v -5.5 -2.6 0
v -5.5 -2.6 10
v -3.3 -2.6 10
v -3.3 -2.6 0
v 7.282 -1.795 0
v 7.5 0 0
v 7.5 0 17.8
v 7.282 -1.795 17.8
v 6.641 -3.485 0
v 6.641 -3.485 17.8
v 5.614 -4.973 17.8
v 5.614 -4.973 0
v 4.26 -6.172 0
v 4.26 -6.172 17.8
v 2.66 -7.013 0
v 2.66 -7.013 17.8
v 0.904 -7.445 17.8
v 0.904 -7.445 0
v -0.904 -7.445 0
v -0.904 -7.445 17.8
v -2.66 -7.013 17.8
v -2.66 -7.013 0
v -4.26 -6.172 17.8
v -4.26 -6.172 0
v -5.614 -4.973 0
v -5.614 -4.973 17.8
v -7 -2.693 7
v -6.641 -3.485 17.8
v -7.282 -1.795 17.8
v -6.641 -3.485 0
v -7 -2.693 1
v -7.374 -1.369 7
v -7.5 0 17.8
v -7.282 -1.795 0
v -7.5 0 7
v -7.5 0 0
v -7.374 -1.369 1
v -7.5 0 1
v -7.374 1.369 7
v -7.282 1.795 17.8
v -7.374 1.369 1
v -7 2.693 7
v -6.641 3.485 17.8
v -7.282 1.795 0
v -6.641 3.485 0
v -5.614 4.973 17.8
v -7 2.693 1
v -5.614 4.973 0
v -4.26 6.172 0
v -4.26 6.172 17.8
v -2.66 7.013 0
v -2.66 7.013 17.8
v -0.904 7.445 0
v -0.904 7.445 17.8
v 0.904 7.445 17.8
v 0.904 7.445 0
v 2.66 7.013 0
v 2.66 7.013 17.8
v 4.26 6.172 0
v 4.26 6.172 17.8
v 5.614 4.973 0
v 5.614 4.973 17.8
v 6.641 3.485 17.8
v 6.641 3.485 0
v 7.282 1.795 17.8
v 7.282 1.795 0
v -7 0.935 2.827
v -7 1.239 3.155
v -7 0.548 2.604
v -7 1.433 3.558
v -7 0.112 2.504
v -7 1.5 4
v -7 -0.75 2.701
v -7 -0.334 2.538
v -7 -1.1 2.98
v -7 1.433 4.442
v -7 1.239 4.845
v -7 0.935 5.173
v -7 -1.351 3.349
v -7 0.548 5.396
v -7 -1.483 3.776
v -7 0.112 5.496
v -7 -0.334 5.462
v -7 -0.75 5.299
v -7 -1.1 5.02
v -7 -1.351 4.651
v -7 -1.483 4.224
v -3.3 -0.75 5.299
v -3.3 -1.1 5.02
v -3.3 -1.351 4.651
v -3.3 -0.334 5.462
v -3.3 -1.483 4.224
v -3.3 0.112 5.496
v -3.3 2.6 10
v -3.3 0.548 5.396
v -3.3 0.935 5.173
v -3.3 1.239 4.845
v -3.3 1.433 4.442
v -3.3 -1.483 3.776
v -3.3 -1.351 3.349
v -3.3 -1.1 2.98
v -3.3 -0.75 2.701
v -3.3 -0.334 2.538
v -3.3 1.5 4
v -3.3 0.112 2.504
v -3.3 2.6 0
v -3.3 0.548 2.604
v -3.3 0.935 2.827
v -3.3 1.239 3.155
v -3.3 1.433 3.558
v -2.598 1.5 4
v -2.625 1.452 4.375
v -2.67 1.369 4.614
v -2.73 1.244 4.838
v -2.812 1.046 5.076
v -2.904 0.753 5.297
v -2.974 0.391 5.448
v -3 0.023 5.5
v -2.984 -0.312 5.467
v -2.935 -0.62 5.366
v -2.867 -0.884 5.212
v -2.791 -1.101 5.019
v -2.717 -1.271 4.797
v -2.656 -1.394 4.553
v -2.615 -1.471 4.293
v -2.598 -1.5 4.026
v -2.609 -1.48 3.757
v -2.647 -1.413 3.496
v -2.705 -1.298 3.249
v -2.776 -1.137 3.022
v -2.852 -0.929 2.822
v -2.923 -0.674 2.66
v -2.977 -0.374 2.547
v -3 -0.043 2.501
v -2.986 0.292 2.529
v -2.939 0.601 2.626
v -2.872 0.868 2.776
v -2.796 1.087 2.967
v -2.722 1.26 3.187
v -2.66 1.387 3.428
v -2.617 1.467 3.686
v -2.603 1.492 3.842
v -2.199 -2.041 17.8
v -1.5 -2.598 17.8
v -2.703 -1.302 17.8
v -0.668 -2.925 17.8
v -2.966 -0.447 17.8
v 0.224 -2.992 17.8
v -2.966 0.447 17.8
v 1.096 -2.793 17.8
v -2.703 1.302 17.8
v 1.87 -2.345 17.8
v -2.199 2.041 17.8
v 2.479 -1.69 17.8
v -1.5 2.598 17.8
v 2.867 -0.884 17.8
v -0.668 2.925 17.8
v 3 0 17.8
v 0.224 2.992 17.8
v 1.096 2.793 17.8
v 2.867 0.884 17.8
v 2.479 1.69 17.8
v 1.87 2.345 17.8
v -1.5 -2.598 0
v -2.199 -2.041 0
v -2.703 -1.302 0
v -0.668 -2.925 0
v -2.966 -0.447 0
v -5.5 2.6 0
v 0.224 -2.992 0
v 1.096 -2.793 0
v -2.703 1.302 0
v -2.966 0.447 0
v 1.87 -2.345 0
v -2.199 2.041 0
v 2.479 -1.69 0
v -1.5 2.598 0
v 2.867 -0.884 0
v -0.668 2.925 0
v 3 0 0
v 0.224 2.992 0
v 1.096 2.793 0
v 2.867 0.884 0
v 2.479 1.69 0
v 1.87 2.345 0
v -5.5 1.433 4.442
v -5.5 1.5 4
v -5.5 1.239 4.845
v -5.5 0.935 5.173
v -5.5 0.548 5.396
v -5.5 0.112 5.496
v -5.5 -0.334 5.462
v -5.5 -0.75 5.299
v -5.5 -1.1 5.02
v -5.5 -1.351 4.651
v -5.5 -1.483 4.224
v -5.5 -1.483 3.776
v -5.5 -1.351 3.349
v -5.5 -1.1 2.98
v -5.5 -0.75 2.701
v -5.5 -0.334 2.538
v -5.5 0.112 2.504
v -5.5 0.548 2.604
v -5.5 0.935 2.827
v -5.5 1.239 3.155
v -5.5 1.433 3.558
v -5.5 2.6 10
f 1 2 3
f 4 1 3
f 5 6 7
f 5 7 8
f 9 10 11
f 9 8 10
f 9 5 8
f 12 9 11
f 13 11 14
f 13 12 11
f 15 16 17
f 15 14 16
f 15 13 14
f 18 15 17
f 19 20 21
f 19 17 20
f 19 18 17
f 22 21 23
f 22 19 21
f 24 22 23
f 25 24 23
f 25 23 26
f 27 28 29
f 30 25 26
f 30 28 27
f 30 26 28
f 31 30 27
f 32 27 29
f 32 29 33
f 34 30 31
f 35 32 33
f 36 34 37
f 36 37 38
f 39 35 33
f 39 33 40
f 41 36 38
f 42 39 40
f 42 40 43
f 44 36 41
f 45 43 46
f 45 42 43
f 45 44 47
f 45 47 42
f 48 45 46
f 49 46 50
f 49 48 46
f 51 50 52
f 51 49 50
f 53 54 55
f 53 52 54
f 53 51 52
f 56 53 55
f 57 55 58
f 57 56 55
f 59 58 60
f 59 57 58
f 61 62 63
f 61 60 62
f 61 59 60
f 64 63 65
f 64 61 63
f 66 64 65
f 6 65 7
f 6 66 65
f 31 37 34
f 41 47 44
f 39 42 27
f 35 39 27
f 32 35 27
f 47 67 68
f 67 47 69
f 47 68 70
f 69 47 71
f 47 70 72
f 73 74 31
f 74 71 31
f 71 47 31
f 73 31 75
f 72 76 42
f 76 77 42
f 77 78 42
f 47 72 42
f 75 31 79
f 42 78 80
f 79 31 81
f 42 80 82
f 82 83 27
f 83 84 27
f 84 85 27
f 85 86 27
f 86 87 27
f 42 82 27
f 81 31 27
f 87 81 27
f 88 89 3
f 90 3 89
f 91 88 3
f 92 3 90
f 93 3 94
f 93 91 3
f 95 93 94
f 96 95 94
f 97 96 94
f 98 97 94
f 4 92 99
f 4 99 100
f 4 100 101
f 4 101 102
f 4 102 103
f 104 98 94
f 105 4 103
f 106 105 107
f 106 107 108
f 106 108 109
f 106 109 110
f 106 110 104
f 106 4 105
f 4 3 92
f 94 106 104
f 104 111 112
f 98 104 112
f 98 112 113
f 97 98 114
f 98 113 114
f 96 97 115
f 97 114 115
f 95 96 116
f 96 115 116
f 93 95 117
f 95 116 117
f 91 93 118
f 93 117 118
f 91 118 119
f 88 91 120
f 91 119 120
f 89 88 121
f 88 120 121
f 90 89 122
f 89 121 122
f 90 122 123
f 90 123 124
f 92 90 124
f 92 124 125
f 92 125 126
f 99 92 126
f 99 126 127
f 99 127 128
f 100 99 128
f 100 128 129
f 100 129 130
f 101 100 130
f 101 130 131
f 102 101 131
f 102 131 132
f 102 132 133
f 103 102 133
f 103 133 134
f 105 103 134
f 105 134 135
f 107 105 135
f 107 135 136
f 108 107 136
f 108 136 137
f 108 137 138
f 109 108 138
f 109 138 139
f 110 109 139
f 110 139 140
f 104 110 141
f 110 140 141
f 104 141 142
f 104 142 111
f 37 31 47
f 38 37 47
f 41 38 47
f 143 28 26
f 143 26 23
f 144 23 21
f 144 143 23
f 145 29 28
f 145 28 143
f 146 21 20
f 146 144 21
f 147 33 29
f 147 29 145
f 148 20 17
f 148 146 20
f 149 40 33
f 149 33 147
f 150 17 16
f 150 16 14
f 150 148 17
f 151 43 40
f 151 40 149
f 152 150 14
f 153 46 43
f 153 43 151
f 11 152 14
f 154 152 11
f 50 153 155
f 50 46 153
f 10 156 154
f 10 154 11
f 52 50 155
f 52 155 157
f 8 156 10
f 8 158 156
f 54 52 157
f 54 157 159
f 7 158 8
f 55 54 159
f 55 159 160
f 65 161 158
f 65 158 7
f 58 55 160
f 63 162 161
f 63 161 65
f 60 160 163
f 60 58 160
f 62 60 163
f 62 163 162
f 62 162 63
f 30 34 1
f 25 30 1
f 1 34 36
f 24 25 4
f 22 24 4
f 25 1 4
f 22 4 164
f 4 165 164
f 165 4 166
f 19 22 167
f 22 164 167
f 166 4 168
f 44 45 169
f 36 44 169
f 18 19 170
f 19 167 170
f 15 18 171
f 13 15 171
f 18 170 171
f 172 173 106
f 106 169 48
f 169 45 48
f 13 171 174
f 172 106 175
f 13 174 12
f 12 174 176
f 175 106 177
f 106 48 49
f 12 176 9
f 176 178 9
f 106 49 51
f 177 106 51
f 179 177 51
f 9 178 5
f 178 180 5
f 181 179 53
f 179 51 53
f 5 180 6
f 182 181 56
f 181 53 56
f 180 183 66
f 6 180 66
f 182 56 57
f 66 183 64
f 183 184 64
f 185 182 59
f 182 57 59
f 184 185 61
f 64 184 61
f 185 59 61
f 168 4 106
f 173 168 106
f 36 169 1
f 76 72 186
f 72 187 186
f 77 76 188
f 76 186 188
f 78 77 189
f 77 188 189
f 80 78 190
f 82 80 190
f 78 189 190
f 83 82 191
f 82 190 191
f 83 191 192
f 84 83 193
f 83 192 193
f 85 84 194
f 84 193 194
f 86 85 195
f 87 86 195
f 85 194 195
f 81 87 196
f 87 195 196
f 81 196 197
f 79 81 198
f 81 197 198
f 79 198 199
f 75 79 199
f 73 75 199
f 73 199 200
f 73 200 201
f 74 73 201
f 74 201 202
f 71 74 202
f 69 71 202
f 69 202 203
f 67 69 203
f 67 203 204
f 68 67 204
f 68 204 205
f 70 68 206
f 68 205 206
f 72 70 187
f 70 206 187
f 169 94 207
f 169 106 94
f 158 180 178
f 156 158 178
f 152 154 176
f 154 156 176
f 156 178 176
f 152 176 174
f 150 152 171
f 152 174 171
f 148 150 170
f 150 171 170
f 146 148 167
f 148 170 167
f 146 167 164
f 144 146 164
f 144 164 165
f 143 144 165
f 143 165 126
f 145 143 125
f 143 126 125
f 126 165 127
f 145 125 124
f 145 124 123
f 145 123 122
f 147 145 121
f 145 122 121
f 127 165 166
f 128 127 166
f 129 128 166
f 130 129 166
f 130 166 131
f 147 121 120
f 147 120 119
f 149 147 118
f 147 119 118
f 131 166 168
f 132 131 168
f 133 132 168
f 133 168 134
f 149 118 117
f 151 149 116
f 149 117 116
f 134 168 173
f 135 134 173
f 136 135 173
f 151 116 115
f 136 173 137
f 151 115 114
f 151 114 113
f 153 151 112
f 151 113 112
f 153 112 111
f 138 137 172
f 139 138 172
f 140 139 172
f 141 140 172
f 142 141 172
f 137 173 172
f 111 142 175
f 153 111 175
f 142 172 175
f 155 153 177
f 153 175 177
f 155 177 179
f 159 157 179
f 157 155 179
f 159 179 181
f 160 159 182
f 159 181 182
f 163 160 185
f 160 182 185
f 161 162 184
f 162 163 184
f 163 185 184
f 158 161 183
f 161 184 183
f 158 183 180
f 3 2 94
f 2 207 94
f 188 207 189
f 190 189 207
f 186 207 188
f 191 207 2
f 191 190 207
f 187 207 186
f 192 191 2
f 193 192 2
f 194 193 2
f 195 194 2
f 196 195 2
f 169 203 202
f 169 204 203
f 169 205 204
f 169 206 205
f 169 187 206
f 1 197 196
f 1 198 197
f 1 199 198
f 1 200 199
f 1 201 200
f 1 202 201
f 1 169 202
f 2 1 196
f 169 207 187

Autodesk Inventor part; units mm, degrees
ref_plane "YZ Plane" through (0, 0, 0) normal (1, 0, 0) x (0, 1, 0)
ref_plane "XZ Plane" through (0, 0, 0) normal (0, 1, 0) x (-1, 0, 0)
sketch "Sketch1" plane through (0, 0, 0) normal (0, 0, 1) x (1, 0, 0)
  circle A0 centre (0, 0) radius 7.5
  circle A1 centre (0, 0) radius 3
  dimension "d0" = 15
  dimension "d1" = 6
extrude "Extrusion1" add sketch "Sketch1" along normal blind 17.8
ref_plane "Work Plane1" through (0, 0, 5) normal (0, 0, 1) x (1, 0, 0)
sketch "Sketch2" plane through (0, 0, 5) normal (0, 0, 1) x (1, 0, 0)
  line L0 (-5.5, -2.6) -> (-3.3, -2.6)
  line L1 (-3.3, -2.6) -> (-3.3, 2.6)
  line L2 (-3.3, 2.6) -> (-5.5, 2.6)
  line L3 (-5.5, 2.6) -> (-5.5, -2.6)
  point P0 (0, 0)
  point P1 (-5.5, 0)
  dimension "d5" = 5.5
  dimension "d6" = 2.2
  dimension "d7" = 5.2
extrude "Extrusion2" cut sketch "Sketch2" along normal mid plane 10
sketch "Sketch4" plane through (0, 0, 0) normal (1, 0, 0) x (0, 1, 0)
  circle A0 centre (0, 4) radius 1.5
  line L0 (-2.1, 0) -> (2.1, 0) projected
  point P0 (0, 0)
  dimension "d12" = 3
  dimension "d13" = 4
extrude "Extrusion3" cut sketch "Sketch4" against normal blind 8
sketch "Sketch5" plane through (0, 0, 0) normal (0, 1, 0) x (-1, 0, 0)
  line L0 (7.5, 0) -> (7.5, 17.8) projected
  line L1 (7.5, 1) -> (7, 1)
  line L2 (7, 1) -> (7, 7)
  line L3 (7, 7) -> (7.5, 7)
  line L4 (7.5, 7) -> (7.5, 1)
  line L5 (-1.5, 0) -> (9, 0) projected
  point P0 (0, 0)
  dimension "d16" = 6
  dimension "d17" = 7
  dimension "d18" = 0.5
extrude "Extrusion4" cut sketch "Sketch5" along normal mid plane 8
properties part number "Acople eje motor"
